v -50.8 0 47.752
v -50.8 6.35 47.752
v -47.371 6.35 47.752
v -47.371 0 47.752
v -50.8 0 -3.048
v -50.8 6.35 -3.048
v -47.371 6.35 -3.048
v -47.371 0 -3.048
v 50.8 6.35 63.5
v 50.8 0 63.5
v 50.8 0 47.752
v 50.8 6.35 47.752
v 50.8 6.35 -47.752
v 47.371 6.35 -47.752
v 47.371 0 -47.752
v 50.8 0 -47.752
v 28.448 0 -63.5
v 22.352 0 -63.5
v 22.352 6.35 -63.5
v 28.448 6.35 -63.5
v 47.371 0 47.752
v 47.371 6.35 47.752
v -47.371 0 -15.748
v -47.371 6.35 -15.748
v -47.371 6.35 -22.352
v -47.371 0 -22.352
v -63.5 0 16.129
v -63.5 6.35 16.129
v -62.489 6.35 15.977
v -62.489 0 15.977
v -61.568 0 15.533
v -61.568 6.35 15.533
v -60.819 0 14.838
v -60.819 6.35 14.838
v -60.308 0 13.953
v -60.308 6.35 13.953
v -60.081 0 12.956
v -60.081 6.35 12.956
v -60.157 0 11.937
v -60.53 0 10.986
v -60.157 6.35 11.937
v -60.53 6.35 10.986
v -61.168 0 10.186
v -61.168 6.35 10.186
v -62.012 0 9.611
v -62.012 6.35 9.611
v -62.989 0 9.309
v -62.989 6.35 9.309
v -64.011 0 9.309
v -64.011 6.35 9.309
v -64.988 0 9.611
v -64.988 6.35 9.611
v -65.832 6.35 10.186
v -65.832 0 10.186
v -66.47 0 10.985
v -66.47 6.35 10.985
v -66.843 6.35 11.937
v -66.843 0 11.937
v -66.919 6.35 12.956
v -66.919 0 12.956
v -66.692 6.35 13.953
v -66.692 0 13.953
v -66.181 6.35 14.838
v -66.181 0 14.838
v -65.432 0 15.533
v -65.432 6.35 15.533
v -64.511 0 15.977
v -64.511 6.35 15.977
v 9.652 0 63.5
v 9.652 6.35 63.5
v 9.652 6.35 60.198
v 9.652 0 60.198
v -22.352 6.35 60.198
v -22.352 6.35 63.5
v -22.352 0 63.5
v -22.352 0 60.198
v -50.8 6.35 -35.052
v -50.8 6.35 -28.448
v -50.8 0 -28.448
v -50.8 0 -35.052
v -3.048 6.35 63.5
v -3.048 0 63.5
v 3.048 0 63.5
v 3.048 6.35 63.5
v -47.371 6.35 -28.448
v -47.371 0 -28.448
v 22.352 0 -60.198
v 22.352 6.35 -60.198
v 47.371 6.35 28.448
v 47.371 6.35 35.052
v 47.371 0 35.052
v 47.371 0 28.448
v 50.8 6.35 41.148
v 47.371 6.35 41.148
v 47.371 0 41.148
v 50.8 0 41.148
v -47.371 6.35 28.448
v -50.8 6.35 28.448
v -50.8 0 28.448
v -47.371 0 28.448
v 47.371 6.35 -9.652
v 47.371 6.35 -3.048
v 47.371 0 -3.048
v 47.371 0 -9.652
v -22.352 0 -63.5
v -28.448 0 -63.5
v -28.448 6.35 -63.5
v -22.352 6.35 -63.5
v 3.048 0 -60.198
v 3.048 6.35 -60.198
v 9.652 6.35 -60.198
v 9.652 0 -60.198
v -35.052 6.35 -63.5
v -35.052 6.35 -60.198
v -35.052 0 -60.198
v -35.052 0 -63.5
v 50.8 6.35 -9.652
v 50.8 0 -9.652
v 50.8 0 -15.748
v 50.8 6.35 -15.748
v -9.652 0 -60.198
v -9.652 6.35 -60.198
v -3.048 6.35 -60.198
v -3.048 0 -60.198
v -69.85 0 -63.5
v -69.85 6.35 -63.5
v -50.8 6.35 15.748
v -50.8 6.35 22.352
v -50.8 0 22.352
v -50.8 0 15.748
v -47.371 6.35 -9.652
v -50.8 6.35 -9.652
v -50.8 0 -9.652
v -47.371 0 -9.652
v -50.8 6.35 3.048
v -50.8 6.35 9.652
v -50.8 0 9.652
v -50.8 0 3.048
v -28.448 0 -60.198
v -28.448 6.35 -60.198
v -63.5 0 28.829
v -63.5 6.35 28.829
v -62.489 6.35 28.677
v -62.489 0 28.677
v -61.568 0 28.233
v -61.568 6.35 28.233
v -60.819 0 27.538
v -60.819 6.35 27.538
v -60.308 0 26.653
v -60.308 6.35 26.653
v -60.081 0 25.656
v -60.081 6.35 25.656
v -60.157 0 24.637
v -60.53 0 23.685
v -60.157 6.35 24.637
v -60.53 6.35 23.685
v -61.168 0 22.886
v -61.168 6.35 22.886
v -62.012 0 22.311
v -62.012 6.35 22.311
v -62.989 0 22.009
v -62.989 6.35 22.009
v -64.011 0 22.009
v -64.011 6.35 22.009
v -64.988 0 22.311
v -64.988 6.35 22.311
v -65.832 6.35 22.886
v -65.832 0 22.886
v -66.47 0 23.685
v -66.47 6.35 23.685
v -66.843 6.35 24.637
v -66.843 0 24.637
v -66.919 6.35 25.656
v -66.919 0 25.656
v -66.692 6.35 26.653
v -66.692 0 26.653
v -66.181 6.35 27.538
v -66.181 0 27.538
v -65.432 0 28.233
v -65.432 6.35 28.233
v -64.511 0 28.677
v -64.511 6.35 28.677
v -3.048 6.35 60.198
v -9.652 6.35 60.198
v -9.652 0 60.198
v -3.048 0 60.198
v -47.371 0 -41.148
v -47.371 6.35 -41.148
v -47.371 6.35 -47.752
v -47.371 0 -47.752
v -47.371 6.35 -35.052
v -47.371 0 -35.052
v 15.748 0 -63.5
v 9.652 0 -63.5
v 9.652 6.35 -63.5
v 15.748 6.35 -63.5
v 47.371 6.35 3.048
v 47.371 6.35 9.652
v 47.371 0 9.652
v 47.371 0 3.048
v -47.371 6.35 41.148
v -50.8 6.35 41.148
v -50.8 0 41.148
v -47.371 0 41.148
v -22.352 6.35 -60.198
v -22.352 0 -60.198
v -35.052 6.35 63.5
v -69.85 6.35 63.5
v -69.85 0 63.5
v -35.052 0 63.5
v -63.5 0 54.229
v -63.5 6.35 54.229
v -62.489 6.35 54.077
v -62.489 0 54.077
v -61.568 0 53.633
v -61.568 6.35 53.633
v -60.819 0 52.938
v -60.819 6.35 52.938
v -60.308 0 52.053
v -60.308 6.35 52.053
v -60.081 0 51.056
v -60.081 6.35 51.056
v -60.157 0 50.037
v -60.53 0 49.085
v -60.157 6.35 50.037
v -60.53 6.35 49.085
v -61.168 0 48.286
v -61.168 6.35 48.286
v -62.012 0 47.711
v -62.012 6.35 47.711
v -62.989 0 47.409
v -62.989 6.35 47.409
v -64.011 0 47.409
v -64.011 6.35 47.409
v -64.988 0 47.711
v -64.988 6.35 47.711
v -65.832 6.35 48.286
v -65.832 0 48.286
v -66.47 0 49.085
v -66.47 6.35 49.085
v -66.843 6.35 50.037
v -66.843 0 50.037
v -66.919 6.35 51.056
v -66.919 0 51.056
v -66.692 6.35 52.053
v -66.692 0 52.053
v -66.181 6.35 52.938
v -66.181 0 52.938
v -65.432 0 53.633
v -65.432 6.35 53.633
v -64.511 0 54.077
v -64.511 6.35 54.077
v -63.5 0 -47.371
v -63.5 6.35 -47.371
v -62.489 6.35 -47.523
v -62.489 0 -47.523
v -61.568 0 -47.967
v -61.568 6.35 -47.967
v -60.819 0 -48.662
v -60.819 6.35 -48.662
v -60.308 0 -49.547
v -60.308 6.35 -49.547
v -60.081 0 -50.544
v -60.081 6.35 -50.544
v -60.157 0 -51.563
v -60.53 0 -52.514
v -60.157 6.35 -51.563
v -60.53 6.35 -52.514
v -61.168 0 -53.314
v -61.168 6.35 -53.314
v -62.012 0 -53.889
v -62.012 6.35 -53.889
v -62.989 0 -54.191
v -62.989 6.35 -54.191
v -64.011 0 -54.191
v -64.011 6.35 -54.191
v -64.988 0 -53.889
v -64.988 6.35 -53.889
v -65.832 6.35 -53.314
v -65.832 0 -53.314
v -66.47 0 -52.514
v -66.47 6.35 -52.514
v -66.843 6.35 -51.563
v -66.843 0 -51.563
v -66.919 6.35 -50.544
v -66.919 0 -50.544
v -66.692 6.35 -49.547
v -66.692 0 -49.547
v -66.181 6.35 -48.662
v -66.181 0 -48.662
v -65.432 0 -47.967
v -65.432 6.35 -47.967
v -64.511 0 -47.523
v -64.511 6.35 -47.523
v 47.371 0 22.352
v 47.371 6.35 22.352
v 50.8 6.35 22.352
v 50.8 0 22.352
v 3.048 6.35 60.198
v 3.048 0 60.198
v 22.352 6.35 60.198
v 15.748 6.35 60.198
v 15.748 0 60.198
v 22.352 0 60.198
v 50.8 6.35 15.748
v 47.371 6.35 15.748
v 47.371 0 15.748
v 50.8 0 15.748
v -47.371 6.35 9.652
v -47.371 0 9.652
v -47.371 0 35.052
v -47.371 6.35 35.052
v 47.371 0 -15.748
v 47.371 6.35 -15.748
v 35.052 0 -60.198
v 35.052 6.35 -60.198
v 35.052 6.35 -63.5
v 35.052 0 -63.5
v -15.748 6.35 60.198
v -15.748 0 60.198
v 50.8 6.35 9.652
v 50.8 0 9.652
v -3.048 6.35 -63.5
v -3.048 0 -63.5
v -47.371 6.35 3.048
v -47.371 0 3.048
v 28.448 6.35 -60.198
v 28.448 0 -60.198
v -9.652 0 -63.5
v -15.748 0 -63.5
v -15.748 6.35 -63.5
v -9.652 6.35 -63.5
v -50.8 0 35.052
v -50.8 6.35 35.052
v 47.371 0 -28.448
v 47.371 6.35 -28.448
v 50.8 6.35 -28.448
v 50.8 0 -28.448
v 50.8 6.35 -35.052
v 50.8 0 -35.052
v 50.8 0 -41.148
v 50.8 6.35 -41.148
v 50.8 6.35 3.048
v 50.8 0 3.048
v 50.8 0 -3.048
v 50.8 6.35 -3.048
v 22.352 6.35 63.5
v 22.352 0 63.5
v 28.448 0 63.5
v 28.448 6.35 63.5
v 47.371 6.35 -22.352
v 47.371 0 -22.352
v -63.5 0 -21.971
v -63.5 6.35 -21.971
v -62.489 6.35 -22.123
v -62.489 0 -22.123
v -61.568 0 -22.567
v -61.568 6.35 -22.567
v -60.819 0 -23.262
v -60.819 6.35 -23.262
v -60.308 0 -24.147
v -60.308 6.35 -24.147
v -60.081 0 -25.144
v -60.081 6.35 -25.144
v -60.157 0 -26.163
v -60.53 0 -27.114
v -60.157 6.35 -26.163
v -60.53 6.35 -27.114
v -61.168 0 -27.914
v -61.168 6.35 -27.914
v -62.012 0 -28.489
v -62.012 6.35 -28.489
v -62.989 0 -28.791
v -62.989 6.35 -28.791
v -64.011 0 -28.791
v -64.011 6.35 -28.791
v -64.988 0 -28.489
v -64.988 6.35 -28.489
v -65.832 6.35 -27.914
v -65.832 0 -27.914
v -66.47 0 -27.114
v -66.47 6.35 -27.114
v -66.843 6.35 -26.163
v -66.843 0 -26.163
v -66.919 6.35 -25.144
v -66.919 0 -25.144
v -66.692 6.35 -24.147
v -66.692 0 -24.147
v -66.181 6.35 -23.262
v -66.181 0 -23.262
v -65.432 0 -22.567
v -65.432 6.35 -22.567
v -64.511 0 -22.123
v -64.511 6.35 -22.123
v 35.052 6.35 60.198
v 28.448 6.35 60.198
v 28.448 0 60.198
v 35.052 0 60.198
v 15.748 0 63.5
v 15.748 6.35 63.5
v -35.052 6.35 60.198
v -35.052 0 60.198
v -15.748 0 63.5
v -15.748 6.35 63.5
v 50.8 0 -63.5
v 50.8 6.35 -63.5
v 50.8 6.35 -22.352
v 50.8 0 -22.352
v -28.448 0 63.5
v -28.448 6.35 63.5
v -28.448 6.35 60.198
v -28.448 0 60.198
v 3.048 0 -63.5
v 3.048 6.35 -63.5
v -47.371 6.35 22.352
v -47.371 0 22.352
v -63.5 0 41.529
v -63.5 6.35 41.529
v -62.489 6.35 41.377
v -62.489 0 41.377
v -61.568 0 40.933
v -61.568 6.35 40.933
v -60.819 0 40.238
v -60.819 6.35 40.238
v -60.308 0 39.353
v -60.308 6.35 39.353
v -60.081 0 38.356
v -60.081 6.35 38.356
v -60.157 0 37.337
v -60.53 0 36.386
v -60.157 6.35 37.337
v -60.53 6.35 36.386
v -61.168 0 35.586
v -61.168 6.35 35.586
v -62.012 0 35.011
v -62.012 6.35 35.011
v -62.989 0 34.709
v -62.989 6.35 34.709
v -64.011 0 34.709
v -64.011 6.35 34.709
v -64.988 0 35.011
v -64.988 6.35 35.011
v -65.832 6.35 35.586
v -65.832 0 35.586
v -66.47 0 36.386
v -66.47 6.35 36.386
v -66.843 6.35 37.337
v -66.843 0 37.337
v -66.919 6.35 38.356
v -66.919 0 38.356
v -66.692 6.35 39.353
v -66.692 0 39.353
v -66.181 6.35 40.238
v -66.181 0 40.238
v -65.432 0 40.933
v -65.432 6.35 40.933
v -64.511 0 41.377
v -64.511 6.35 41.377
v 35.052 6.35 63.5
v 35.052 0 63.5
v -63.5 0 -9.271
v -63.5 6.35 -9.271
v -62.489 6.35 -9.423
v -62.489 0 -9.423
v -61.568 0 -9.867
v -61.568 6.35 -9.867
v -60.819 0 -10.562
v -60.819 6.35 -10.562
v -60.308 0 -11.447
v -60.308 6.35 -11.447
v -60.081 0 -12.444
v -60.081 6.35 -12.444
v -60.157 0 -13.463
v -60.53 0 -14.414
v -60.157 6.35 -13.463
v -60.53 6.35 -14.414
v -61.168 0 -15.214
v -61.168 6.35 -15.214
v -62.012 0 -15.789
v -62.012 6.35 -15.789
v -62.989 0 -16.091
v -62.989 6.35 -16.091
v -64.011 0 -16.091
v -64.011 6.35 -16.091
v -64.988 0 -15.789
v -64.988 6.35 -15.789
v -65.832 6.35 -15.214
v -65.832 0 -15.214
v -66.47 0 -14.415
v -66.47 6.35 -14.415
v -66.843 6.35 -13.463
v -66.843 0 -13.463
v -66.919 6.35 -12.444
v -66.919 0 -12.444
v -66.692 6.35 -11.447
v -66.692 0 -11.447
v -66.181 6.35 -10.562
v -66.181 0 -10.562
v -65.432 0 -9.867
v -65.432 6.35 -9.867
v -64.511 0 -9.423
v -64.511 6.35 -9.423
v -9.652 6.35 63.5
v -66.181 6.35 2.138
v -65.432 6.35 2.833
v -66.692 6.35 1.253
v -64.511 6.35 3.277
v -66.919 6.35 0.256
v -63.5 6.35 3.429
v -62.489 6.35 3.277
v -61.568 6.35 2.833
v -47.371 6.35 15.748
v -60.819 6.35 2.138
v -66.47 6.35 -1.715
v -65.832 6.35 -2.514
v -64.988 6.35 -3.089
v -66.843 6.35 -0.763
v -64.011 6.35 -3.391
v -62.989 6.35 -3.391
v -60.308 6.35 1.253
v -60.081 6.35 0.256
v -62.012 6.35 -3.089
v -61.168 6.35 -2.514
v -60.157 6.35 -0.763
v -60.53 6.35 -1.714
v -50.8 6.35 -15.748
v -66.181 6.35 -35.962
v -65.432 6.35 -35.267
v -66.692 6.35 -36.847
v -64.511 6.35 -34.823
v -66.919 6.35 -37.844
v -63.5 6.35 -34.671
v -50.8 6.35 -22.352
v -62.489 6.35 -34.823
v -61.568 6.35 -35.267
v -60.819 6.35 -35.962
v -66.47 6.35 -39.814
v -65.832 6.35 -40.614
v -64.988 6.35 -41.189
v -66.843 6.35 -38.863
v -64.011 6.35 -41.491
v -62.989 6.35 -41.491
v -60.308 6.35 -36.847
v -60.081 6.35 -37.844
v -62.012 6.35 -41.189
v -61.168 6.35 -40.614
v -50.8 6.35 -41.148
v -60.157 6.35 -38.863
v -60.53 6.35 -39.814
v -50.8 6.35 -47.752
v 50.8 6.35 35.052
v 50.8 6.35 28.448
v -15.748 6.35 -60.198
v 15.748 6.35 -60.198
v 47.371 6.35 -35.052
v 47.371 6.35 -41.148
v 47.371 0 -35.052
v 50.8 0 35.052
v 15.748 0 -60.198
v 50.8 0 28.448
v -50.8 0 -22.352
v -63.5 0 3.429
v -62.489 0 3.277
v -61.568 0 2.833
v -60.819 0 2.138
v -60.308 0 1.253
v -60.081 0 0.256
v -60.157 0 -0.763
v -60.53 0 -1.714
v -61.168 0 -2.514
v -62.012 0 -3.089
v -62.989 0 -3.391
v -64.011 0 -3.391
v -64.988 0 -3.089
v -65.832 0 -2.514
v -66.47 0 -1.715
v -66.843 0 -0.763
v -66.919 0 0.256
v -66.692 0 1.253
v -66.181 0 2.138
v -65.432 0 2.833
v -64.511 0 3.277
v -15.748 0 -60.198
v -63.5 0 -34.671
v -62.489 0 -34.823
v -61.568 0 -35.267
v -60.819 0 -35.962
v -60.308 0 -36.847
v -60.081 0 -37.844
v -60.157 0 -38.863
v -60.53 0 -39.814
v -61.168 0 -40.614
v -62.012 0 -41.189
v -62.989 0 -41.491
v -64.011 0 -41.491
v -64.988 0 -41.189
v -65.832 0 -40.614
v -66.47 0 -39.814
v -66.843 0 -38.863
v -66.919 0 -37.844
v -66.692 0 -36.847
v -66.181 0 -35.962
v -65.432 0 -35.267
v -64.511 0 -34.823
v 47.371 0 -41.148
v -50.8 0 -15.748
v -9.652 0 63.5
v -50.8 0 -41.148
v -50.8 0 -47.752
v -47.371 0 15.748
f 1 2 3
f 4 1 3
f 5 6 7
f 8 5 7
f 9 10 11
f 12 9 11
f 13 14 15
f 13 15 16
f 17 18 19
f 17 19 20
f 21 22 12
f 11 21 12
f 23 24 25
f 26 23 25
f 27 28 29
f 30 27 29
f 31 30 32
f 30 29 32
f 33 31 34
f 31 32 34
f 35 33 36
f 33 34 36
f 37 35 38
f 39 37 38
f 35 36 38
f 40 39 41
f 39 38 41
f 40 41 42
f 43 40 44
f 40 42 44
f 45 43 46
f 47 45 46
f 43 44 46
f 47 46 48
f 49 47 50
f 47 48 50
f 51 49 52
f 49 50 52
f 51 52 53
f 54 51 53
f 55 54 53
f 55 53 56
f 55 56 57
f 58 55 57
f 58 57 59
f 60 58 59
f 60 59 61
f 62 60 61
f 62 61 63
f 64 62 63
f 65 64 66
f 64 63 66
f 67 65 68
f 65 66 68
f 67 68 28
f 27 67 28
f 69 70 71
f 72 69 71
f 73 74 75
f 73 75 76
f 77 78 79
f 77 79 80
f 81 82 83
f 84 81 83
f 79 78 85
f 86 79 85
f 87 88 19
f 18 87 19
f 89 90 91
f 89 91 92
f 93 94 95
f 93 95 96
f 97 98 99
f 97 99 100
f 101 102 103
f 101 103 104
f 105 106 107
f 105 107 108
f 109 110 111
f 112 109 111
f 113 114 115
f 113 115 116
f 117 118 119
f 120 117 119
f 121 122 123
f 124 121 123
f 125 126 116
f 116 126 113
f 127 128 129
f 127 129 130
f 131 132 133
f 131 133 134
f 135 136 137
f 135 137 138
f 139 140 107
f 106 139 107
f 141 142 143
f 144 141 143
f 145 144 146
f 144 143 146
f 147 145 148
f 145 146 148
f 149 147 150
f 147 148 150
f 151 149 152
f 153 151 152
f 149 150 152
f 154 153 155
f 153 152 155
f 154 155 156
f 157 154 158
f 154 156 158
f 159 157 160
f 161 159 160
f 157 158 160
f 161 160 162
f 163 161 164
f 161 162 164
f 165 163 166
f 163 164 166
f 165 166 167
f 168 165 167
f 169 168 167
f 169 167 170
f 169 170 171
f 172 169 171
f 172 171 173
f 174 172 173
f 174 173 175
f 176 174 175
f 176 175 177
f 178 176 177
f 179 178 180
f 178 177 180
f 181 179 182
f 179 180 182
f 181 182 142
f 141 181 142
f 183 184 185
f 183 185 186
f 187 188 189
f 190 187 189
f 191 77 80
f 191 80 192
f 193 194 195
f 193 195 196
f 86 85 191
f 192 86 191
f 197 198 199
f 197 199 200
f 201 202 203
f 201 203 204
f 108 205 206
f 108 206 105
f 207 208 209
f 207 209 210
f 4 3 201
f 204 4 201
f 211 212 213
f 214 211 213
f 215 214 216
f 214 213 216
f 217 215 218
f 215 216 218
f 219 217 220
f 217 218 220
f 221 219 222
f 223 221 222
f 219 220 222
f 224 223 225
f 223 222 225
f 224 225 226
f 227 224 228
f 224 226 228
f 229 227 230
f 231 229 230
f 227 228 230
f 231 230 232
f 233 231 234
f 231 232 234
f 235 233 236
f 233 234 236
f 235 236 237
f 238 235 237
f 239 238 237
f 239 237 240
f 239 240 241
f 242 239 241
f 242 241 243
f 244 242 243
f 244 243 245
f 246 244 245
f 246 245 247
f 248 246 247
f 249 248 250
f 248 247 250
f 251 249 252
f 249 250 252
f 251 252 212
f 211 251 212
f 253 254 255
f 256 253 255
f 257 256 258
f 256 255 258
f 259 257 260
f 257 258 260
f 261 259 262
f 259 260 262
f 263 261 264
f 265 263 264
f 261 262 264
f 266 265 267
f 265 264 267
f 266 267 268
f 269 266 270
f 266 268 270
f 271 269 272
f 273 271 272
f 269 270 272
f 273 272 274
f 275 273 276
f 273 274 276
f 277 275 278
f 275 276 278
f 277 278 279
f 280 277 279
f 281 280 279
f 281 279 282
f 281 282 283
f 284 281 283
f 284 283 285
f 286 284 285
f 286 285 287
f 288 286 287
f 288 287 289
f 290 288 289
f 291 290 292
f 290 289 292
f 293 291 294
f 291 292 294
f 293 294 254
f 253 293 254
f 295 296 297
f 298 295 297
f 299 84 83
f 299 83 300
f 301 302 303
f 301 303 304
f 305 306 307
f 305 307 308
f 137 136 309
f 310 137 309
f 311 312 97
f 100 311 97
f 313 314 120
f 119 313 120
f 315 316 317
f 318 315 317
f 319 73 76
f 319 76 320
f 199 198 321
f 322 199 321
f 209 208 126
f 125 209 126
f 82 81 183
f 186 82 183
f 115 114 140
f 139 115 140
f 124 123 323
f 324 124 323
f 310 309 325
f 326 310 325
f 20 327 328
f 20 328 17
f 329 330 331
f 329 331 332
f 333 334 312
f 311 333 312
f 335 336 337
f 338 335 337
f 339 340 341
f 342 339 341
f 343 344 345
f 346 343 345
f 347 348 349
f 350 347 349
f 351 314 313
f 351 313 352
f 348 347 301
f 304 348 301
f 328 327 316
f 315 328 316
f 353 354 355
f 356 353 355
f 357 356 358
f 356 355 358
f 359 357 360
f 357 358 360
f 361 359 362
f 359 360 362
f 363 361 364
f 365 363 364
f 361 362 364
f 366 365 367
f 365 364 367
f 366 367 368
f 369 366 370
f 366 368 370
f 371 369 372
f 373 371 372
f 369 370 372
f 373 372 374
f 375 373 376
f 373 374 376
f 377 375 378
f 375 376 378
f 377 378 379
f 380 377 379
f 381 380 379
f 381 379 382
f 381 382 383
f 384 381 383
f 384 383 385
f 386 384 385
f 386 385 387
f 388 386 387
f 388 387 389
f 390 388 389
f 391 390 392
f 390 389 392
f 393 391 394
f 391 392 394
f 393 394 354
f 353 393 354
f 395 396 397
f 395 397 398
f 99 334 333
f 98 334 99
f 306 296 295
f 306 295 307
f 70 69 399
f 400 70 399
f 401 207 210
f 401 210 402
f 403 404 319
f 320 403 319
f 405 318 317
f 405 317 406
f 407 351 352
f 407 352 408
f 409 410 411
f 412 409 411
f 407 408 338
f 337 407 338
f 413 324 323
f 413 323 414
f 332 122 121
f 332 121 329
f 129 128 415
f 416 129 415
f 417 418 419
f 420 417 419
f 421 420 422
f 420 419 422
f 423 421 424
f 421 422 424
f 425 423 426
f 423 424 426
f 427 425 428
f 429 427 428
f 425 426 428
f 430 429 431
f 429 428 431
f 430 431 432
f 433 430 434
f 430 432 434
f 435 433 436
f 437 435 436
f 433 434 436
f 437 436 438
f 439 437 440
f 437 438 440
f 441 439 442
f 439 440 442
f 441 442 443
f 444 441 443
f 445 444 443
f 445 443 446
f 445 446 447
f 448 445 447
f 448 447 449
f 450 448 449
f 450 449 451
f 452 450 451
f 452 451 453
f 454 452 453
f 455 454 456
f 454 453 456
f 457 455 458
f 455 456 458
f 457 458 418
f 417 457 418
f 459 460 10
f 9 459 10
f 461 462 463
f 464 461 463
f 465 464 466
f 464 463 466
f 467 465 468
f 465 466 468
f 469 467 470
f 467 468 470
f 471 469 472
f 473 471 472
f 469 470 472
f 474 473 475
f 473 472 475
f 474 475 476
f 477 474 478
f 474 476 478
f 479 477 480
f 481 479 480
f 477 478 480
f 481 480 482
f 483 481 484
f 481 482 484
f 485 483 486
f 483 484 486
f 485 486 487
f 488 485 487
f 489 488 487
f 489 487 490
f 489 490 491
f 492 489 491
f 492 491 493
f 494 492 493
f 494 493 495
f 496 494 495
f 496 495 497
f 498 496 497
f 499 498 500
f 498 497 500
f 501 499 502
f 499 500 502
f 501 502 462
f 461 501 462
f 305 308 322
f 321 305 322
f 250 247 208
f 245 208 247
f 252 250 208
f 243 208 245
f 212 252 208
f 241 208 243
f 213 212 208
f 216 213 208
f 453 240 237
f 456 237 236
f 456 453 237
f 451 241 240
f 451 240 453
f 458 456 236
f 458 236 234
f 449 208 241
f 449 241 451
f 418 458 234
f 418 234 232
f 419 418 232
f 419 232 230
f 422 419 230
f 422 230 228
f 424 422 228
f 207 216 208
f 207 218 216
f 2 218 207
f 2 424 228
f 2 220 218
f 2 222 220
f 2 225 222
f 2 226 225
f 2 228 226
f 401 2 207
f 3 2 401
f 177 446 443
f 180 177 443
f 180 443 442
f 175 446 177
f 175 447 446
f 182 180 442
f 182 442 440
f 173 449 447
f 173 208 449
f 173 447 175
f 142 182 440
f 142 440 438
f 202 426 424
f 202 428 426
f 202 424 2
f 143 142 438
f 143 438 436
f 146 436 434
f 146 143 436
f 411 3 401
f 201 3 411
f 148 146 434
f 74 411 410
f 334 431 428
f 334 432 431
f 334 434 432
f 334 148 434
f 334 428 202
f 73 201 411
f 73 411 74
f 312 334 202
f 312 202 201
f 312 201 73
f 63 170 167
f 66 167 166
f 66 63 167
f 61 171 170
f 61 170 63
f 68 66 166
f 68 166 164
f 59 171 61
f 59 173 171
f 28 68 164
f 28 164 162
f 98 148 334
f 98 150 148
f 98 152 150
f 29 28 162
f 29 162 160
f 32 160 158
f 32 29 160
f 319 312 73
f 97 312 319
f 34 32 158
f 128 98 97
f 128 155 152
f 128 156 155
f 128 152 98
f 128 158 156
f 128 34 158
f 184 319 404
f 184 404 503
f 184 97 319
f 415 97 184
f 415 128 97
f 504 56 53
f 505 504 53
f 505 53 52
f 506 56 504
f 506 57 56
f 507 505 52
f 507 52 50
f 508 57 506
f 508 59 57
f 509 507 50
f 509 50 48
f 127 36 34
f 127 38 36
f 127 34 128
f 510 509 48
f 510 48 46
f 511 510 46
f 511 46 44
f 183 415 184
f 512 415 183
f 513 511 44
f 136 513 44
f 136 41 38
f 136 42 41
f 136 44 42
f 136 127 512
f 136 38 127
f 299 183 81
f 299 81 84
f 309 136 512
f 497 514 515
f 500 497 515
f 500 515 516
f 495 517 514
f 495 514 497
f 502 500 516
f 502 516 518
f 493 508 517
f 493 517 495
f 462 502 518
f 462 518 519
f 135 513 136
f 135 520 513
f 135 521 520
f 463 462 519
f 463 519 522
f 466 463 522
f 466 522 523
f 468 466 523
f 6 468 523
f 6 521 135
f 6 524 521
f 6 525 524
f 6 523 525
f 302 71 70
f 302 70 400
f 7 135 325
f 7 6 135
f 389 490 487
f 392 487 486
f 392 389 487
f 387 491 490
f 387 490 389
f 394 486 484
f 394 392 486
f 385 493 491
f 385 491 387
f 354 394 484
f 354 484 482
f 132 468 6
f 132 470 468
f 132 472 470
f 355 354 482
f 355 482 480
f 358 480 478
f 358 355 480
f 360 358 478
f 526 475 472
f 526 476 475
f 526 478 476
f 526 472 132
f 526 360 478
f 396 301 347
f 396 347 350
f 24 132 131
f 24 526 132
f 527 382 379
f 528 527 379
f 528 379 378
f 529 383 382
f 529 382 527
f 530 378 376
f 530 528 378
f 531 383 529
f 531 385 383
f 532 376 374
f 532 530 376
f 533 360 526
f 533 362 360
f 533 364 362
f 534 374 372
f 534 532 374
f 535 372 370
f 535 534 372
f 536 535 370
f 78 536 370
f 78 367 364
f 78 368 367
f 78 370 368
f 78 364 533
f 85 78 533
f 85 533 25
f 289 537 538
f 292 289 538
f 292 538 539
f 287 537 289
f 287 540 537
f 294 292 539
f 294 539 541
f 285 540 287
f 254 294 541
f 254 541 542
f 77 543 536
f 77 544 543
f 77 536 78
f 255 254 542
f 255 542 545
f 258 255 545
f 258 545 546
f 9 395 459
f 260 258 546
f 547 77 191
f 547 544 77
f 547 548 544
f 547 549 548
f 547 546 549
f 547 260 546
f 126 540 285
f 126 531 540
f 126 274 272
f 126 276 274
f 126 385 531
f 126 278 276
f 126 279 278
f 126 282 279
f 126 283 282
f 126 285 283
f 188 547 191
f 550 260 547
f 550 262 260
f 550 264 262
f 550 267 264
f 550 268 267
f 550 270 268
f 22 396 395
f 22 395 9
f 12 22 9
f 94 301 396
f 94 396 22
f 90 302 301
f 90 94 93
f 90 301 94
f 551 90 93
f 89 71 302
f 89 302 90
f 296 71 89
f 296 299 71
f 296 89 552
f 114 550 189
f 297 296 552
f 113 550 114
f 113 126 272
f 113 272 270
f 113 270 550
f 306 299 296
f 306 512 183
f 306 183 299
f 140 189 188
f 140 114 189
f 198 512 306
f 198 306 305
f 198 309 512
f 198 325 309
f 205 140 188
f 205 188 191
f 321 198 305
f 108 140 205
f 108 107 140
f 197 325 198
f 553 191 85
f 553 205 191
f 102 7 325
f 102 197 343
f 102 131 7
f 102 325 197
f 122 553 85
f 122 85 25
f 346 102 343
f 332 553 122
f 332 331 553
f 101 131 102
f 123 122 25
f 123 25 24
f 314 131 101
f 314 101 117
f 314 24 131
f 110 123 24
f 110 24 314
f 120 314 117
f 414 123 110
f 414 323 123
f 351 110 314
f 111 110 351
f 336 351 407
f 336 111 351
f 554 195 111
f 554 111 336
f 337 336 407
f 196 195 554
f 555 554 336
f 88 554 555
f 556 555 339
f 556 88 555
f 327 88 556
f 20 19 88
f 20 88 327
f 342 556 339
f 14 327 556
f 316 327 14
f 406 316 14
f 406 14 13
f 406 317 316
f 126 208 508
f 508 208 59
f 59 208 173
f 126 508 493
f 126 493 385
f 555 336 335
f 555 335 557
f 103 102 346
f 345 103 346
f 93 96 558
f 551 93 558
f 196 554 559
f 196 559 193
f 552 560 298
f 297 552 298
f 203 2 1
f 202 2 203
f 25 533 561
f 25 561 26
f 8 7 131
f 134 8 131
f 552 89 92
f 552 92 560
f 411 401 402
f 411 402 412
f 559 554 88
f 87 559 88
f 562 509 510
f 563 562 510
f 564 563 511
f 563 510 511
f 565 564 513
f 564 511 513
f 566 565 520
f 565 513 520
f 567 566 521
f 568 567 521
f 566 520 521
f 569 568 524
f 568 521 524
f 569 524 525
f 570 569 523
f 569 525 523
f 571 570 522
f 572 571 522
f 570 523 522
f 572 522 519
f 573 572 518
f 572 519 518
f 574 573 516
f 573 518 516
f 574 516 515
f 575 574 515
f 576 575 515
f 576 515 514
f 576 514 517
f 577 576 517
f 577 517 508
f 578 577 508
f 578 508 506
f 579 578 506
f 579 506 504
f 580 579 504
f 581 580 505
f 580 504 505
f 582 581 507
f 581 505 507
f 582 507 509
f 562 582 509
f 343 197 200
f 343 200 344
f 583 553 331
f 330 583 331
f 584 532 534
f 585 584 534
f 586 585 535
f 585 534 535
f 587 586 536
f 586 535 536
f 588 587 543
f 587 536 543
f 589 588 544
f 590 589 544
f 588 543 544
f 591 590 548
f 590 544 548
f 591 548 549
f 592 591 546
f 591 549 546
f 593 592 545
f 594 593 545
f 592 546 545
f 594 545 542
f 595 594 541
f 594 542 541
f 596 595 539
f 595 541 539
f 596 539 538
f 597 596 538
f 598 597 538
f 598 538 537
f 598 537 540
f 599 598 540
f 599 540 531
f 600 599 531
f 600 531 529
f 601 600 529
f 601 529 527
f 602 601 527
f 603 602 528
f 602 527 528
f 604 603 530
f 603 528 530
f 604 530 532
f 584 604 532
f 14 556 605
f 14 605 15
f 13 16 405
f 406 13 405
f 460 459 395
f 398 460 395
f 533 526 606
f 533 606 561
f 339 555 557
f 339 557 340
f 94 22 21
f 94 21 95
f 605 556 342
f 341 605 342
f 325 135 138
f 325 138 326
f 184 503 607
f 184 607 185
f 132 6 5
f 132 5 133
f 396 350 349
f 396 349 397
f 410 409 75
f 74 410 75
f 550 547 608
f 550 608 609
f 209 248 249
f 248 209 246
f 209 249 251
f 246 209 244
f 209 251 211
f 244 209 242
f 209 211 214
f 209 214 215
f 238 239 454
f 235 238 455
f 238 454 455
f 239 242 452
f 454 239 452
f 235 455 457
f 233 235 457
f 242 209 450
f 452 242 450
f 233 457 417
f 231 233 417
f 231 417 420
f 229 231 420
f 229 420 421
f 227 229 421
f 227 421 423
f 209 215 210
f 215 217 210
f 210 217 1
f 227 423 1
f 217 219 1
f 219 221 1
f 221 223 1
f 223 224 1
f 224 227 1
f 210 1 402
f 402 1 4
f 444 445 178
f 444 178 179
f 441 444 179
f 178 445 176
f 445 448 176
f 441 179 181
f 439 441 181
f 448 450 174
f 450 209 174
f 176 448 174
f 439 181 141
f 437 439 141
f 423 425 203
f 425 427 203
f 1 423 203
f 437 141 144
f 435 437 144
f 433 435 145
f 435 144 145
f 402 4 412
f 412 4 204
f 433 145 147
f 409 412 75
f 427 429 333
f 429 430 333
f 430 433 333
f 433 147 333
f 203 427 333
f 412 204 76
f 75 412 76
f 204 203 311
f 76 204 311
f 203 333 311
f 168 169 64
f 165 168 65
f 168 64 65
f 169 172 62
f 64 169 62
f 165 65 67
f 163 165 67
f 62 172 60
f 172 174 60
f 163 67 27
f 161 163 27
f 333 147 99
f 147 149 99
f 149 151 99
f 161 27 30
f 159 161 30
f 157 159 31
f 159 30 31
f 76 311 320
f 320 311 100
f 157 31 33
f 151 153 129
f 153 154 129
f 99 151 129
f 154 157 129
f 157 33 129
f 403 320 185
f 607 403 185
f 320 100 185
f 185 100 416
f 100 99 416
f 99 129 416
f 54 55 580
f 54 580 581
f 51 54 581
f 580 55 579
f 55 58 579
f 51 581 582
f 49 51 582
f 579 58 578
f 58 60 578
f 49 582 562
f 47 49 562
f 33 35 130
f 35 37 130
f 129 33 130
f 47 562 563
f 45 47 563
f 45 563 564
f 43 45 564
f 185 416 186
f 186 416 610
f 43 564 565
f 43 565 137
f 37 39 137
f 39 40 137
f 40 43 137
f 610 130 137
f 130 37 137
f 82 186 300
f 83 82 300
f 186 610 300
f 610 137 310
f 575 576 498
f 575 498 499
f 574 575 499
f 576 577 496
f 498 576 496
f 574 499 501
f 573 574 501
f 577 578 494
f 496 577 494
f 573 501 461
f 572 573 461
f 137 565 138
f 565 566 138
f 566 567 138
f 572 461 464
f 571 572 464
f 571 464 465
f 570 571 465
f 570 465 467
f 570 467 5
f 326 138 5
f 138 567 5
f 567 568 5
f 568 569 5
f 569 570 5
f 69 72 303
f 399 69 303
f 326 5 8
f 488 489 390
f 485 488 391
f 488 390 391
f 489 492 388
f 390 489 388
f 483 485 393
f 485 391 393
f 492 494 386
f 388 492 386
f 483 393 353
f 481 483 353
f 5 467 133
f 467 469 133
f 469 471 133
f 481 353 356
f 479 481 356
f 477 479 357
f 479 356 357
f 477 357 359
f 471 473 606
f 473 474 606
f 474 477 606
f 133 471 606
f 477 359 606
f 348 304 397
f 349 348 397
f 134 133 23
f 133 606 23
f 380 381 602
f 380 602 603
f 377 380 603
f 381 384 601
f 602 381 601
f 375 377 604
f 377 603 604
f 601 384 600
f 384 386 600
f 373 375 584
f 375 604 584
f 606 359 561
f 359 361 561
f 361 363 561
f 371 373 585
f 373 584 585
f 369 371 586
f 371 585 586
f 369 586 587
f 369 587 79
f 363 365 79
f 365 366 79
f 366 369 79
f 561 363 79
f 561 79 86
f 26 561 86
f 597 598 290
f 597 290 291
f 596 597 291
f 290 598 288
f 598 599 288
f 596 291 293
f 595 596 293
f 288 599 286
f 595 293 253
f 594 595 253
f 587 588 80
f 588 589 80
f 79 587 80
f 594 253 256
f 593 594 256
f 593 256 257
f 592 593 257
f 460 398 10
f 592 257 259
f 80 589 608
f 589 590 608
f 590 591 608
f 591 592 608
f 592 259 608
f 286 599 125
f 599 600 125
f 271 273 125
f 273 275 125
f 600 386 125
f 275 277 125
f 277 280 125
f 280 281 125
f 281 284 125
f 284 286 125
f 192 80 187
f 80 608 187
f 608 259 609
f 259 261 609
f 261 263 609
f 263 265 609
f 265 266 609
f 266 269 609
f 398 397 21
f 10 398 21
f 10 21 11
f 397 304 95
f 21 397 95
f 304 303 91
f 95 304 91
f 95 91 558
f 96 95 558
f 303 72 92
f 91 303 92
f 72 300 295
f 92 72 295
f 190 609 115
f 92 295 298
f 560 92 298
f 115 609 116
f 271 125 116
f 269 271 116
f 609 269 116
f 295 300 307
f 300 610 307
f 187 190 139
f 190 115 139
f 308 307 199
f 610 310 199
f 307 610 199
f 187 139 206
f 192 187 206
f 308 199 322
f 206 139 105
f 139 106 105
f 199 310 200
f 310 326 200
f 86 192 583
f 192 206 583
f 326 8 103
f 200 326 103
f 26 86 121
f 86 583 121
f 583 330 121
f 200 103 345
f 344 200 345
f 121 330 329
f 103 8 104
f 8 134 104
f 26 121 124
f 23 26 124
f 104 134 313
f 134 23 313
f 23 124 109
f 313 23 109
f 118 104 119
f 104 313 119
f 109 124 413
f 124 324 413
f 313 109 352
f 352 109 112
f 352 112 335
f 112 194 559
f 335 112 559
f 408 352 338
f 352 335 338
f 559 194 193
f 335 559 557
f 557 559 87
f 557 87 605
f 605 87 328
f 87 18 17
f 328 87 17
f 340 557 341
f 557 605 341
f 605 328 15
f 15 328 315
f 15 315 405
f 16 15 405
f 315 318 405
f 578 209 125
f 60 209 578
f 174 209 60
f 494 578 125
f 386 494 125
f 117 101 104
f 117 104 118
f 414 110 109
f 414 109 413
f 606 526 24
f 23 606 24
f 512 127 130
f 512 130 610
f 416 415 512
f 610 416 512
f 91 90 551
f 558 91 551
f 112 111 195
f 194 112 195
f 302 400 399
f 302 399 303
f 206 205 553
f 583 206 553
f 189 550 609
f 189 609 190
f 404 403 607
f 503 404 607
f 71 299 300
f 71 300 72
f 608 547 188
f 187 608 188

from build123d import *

# Parameters (mm, degrees)
SKETCH1_W           = 101.6
SKETCH1_H           = 127
BOSS_EXTRUDE1_DEPTH = 6.35
SKETCH2_W           = 6.604
SKETCH2_H           = 3.302
SKETCH2_W_2         = 3.429
SKETCH2_H_2         = 6.604
CUT_EXTRUDE1_DEPTH  = 82.567226875
SKETCH3_W           = 63.5
SKETCH3_H           = 127
SKETCH3_R           = 3.429
BOSS_EXTRUDE2_DEPTH = 6.35
SKETCH4_W           = 44.45
SKETCH4_H           = 127
CUT_EXTRUDE2_DEPTH  = 131.908603613


with BuildPart() as part:
    # Sketch1 → Boss-Extrude1 (new body)
    with BuildSketch(Plane(origin=(0, 0, 0), x_dir=(1, 0, 0), z_dir=(0, 1, 0))):
        Rectangle(SKETCH1_W, SKETCH1_H)
    extrude(amount=BOSS_EXTRUDE1_DEPTH)

    # Sketch2 → Cut-Extrude1 (cut, through all)
    with BuildSketch(Plane(origin=(0, 6.35, 0), x_dir=(1, 0, 0), z_dir=(0, 1, 0))):
        with Locations((-31.75, -61.849)):
            Rectangle(SKETCH2_W, SKETCH2_H)
        with Locations((-19.05, -61.849)):
            Rectangle(SKETCH2_W, SKETCH2_H)
        with Locations((-6.35, -61.849)):
            Rectangle(SKETCH2_W, SKETCH2_H)
        with Locations((6.35, -61.849)):
            Rectangle(SKETCH2_W, SKETCH2_H)
        with Locations((19.05, -61.849)):
            Rectangle(SKETCH2_W, SKETCH2_H)
        with Locations((31.75, -61.849)):
            Rectangle(SKETCH2_W, SKETCH2_H)
        with Locations((31.75, 61.849)):
            Rectangle(SKETCH2_W, SKETCH2_H)
        with Locations((19.05, 61.849)):
            Rectangle(SKETCH2_W, SKETCH2_H)
        with Locations((6.35, 61.849)):
            Rectangle(SKETCH2_W, SKETCH2_H)
        with Locations((-6.35, 61.849)):
            Rectangle(SKETCH2_W, SKETCH2_H)
        with Locations((-19.05, 61.849)):
            Rectangle(SKETCH2_W, SKETCH2_H)
        with Locations((-31.75, 61.849)):
            Rectangle(SKETCH2_W, SKETCH2_H)
        with Locations((-49.0855, 31.75)):
            Rectangle(SKETCH2_W_2, SKETCH2_H_2)
        with Locations((-49.0855, 19.05)):
            Rectangle(SKETCH2_W_2, SKETCH2_H_2)
        with Locations((-49.0855, 6.35)):
            Rectangle(SKETCH2_W_2, SKETCH2_H_2)
        with Locations((-49.0855, -6.35)):
            Rectangle(SKETCH2_W_2, SKETCH2_H_2)
        with Locations((-49.0855, -19.05)):
            Rectangle(SKETCH2_W_2, SKETCH2_H_2)
        with Locations((-49.0855, -31.75)):
            Rectangle(SKETCH2_W_2, SKETCH2_H_2)
        with Locations((49.0855, -31.75)):
            Rectangle(SKETCH2_W_2, SKETCH2_H_2)
        with Locations((49.0855, -19.05)):
            Rectangle(SKETCH2_W_2, SKETCH2_H_2)
        with Locations((49.0855, -6.35)):
            Rectangle(SKETCH2_W_2, SKETCH2_H_2)
        with Locations((49.0855, 6.35)):
            Rectangle(SKETCH2_W_2, SKETCH2_H_2)
        with Locations((49.0855, 19.05)):
            Rectangle(SKETCH2_W_2, SKETCH2_H_2)
        with Locations((49.0855, 31.75)):
            Rectangle(SKETCH2_W_2, SKETCH2_H_2)
        with Locations((-49.0855, 44.45)):
            Rectangle(SKETCH2_W_2, SKETCH2_H_2)
        with Locations((-49.0855, -44.45)):
            Rectangle(SKETCH2_W_2, SKETCH2_H_2)
        with Locations((49.0855, -44.45)):
            Rectangle(SKETCH2_W_2, SKETCH2_H_2)
        with Locations((49.0855, 44.45)):
            Rectangle(SKETCH2_W_2, SKETCH2_H_2)
    extrude(amount=-CUT_EXTRUDE1_DEPTH, mode=Mode.SUBTRACT)

    # Sketch3 → Boss-Extrude2 (add)
    with BuildSketch(Plane(origin=(0, 6.35, 0), x_dir=(1, 0, 0), z_dir=(0, 1, 0))):
        with Locations((-82.55, 0)):
            Rectangle(SKETCH3_W, SKETCH3_H)
        with Locations(Location((-101.6, 50.8, 0), (0, 0, 270))):
            Circle(SKETCH3_R, mode=Mode.SUBTRACT)
        with Locations(Location((-88.9, 50.8, 0), (0, 0, 270))):
            Circle(SKETCH3_R, mode=Mode.SUBTRACT)
        with Locations(Location((-88.9, 38.1, 0), (0, 0, 270))):
            Circle(SKETCH3_R, mode=Mode.SUBTRACT)
        with Locations(Location((-101.6, 38.1, 0), (0, 0, 270))):
            Circle(SKETCH3_R, mode=Mode.SUBTRACT)
        with Locations(Location((-101.6, 25.4, 0), (0, 0, 270))):
            Circle(SKETCH3_R, mode=Mode.SUBTRACT)
        with Locations(Location((-88.9, 25.4, 0), (0, 0, 270))):
            Circle(SKETCH3_R, mode=Mode.SUBTRACT)
        with Locations(Location((-76.2, 50.8, 0), (0, 0, 270))):
            Circle(SKETCH3_R, mode=Mode.SUBTRACT)
        with Locations(Location((-63.5, 50.8, 0), (0, 0, 270))):
            Circle(SKETCH3_R, mode=Mode.SUBTRACT)
        with Locations(Location((-76.2, 38.1, 0), (0, 0, 270))):
            Circle(SKETCH3_R, mode=Mode.SUBTRACT)
        with Locations(Location((-63.5, 38.1, 0), (0, 0, 270))):
            Circle(SKETCH3_R, mode=Mode.SUBTRACT)
        with Locations(Location((-76.2, 25.4, 0), (0, 0, 270))):
            Circle(SKETCH3_R, mode=Mode.SUBTRACT)
        with Locations(Location((-63.5, 25.4, 0), (0, 0, 270))):
            Circle(SKETCH3_R, mode=Mode.SUBTRACT)
        with Locations(Location((-101.6, 12.7, 0), (0, 0, 270))):
            Circle(SKETCH3_R, mode=Mode.SUBTRACT)
        with Locations(Location((-88.9, 12.7, 0), (0, 0, 270))):
            Circle(SKETCH3_R, mode=Mode.SUBTRACT)
        with Locations(Location((-76.2, 12.7, 0), (0, 0, 270))):
            Circle(SKETCH3_R, mode=Mode.SUBTRACT)
        with Locations(Location((-63.5, 12.7, 0), (0, 0, 270))):
            Circle(SKETCH3_R, mode=Mode.SUBTRACT)
        with Locations(Location((-101.6, 0, 0), (0, 0, 270))):
            Circle(SKETCH3_R, mode=Mode.SUBTRACT)
        with Locations(Location((-88.9, 0, 0), (0, 0, 270))):
            Circle(SKETCH3_R, mode=Mode.SUBTRACT)
        with Locations(Location((-76.2, 0, 0), (0, 0, 270))):
            Circle(SKETCH3_R, mode=Mode.SUBTRACT)
        with Locations(Location((-63.5, 0, 0), (0, 0, 270))):
            Circle(SKETCH3_R, mode=Mode.SUBTRACT)
        with Locations(Location((-101.6, -12.7, 0), (0, 0, 270))):
            Circle(SKETCH3_R, mode=Mode.SUBTRACT)
        with Locations(Location((-88.9, -12.7, 0), (0, 0, 270))):
            Circle(SKETCH3_R, mode=Mode.SUBTRACT)
        with Locations(Location((-76.2, -12.7, 0), (0, 0, 270))):
            Circle(SKETCH3_R, mode=Mode.SUBTRACT)
        with Locations(Location((-63.5, -12.7, 0), (0, 0, 270))):
            Circle(SKETCH3_R, mode=Mode.SUBTRACT)
        with Locations(Location((-101.6, -25.4, 0), (0, 0, 270))):
            Circle(SKETCH3_R, mode=Mode.SUBTRACT)
        with Locations(Location((-88.9, -25.4, 0), (0, 0, 270))):
            Circle(SKETCH3_R, mode=Mode.SUBTRACT)
        with Locations(Location((-76.2, -25.4, 0), (0, 0, 270))):
            Circle(SKETCH3_R, mode=Mode.SUBTRACT)
        with Locations(Location((-63.5, -25.4, 0), (0, 0, 270))):
            Circle(SKETCH3_R, mode=Mode.SUBTRACT)
        with Locations(Location((-101.6, -38.1, 0), (0, 0, 270))):
            Circle(SKETCH3_R, mode=Mode.SUBTRACT)
        with Locations(Location((-88.9, -38.1, 0), (0, 0, 270))):
            Circle(SKETCH3_R, mode=Mode.SUBTRACT)
        with Locations(Location((-76.2, -38.1, 0), (0, 0, 270))):
            Circle(SKETCH3_R, mode=Mode.SUBTRACT)
        with Locations(Location((-63.5, -38.1, 0), (0, 0, 270))):
            Circle(SKETCH3_R, mode=Mode.SUBTRACT)
        with Locations(Location((-101.6, -50.8, 0), (0, 0, 270))):
            Circle(SKETCH3_R, mode=Mode.SUBTRACT)
        with Locations(Location((-88.9, -50.8, 0), (0, 0, 270))):
            Circle(SKETCH3_R, mode=Mode.SUBTRACT)
        with Locations(Location((-76.2, -50.8, 0), (0, 0, 270))):
            Circle(SKETCH3_R, mode=Mode.SUBTRACT)
        with Locations(Location((-63.5, -50.8, 0), (0, 0, 270))):
            Circle(SKETCH3_R, mode=Mode.SUBTRACT)
    extrude(amount=-BOSS_EXTRUDE2_DEPTH)

    # Sketch4 → Cut-Extrude2 (cut, through all)
    with BuildSketch(Plane(origin=(0, 6.35, 0), x_dir=(1, 0, 0), z_dir=(0, 1, 0))):
        with Locations((-92.075, 0)):
            Rectangle(SKETCH4_W, SKETCH4_H)
    extrude(amount=-CUT_EXTRUDE2_DEPTH, mode=Mode.SUBTRACT)


solid = part.part
